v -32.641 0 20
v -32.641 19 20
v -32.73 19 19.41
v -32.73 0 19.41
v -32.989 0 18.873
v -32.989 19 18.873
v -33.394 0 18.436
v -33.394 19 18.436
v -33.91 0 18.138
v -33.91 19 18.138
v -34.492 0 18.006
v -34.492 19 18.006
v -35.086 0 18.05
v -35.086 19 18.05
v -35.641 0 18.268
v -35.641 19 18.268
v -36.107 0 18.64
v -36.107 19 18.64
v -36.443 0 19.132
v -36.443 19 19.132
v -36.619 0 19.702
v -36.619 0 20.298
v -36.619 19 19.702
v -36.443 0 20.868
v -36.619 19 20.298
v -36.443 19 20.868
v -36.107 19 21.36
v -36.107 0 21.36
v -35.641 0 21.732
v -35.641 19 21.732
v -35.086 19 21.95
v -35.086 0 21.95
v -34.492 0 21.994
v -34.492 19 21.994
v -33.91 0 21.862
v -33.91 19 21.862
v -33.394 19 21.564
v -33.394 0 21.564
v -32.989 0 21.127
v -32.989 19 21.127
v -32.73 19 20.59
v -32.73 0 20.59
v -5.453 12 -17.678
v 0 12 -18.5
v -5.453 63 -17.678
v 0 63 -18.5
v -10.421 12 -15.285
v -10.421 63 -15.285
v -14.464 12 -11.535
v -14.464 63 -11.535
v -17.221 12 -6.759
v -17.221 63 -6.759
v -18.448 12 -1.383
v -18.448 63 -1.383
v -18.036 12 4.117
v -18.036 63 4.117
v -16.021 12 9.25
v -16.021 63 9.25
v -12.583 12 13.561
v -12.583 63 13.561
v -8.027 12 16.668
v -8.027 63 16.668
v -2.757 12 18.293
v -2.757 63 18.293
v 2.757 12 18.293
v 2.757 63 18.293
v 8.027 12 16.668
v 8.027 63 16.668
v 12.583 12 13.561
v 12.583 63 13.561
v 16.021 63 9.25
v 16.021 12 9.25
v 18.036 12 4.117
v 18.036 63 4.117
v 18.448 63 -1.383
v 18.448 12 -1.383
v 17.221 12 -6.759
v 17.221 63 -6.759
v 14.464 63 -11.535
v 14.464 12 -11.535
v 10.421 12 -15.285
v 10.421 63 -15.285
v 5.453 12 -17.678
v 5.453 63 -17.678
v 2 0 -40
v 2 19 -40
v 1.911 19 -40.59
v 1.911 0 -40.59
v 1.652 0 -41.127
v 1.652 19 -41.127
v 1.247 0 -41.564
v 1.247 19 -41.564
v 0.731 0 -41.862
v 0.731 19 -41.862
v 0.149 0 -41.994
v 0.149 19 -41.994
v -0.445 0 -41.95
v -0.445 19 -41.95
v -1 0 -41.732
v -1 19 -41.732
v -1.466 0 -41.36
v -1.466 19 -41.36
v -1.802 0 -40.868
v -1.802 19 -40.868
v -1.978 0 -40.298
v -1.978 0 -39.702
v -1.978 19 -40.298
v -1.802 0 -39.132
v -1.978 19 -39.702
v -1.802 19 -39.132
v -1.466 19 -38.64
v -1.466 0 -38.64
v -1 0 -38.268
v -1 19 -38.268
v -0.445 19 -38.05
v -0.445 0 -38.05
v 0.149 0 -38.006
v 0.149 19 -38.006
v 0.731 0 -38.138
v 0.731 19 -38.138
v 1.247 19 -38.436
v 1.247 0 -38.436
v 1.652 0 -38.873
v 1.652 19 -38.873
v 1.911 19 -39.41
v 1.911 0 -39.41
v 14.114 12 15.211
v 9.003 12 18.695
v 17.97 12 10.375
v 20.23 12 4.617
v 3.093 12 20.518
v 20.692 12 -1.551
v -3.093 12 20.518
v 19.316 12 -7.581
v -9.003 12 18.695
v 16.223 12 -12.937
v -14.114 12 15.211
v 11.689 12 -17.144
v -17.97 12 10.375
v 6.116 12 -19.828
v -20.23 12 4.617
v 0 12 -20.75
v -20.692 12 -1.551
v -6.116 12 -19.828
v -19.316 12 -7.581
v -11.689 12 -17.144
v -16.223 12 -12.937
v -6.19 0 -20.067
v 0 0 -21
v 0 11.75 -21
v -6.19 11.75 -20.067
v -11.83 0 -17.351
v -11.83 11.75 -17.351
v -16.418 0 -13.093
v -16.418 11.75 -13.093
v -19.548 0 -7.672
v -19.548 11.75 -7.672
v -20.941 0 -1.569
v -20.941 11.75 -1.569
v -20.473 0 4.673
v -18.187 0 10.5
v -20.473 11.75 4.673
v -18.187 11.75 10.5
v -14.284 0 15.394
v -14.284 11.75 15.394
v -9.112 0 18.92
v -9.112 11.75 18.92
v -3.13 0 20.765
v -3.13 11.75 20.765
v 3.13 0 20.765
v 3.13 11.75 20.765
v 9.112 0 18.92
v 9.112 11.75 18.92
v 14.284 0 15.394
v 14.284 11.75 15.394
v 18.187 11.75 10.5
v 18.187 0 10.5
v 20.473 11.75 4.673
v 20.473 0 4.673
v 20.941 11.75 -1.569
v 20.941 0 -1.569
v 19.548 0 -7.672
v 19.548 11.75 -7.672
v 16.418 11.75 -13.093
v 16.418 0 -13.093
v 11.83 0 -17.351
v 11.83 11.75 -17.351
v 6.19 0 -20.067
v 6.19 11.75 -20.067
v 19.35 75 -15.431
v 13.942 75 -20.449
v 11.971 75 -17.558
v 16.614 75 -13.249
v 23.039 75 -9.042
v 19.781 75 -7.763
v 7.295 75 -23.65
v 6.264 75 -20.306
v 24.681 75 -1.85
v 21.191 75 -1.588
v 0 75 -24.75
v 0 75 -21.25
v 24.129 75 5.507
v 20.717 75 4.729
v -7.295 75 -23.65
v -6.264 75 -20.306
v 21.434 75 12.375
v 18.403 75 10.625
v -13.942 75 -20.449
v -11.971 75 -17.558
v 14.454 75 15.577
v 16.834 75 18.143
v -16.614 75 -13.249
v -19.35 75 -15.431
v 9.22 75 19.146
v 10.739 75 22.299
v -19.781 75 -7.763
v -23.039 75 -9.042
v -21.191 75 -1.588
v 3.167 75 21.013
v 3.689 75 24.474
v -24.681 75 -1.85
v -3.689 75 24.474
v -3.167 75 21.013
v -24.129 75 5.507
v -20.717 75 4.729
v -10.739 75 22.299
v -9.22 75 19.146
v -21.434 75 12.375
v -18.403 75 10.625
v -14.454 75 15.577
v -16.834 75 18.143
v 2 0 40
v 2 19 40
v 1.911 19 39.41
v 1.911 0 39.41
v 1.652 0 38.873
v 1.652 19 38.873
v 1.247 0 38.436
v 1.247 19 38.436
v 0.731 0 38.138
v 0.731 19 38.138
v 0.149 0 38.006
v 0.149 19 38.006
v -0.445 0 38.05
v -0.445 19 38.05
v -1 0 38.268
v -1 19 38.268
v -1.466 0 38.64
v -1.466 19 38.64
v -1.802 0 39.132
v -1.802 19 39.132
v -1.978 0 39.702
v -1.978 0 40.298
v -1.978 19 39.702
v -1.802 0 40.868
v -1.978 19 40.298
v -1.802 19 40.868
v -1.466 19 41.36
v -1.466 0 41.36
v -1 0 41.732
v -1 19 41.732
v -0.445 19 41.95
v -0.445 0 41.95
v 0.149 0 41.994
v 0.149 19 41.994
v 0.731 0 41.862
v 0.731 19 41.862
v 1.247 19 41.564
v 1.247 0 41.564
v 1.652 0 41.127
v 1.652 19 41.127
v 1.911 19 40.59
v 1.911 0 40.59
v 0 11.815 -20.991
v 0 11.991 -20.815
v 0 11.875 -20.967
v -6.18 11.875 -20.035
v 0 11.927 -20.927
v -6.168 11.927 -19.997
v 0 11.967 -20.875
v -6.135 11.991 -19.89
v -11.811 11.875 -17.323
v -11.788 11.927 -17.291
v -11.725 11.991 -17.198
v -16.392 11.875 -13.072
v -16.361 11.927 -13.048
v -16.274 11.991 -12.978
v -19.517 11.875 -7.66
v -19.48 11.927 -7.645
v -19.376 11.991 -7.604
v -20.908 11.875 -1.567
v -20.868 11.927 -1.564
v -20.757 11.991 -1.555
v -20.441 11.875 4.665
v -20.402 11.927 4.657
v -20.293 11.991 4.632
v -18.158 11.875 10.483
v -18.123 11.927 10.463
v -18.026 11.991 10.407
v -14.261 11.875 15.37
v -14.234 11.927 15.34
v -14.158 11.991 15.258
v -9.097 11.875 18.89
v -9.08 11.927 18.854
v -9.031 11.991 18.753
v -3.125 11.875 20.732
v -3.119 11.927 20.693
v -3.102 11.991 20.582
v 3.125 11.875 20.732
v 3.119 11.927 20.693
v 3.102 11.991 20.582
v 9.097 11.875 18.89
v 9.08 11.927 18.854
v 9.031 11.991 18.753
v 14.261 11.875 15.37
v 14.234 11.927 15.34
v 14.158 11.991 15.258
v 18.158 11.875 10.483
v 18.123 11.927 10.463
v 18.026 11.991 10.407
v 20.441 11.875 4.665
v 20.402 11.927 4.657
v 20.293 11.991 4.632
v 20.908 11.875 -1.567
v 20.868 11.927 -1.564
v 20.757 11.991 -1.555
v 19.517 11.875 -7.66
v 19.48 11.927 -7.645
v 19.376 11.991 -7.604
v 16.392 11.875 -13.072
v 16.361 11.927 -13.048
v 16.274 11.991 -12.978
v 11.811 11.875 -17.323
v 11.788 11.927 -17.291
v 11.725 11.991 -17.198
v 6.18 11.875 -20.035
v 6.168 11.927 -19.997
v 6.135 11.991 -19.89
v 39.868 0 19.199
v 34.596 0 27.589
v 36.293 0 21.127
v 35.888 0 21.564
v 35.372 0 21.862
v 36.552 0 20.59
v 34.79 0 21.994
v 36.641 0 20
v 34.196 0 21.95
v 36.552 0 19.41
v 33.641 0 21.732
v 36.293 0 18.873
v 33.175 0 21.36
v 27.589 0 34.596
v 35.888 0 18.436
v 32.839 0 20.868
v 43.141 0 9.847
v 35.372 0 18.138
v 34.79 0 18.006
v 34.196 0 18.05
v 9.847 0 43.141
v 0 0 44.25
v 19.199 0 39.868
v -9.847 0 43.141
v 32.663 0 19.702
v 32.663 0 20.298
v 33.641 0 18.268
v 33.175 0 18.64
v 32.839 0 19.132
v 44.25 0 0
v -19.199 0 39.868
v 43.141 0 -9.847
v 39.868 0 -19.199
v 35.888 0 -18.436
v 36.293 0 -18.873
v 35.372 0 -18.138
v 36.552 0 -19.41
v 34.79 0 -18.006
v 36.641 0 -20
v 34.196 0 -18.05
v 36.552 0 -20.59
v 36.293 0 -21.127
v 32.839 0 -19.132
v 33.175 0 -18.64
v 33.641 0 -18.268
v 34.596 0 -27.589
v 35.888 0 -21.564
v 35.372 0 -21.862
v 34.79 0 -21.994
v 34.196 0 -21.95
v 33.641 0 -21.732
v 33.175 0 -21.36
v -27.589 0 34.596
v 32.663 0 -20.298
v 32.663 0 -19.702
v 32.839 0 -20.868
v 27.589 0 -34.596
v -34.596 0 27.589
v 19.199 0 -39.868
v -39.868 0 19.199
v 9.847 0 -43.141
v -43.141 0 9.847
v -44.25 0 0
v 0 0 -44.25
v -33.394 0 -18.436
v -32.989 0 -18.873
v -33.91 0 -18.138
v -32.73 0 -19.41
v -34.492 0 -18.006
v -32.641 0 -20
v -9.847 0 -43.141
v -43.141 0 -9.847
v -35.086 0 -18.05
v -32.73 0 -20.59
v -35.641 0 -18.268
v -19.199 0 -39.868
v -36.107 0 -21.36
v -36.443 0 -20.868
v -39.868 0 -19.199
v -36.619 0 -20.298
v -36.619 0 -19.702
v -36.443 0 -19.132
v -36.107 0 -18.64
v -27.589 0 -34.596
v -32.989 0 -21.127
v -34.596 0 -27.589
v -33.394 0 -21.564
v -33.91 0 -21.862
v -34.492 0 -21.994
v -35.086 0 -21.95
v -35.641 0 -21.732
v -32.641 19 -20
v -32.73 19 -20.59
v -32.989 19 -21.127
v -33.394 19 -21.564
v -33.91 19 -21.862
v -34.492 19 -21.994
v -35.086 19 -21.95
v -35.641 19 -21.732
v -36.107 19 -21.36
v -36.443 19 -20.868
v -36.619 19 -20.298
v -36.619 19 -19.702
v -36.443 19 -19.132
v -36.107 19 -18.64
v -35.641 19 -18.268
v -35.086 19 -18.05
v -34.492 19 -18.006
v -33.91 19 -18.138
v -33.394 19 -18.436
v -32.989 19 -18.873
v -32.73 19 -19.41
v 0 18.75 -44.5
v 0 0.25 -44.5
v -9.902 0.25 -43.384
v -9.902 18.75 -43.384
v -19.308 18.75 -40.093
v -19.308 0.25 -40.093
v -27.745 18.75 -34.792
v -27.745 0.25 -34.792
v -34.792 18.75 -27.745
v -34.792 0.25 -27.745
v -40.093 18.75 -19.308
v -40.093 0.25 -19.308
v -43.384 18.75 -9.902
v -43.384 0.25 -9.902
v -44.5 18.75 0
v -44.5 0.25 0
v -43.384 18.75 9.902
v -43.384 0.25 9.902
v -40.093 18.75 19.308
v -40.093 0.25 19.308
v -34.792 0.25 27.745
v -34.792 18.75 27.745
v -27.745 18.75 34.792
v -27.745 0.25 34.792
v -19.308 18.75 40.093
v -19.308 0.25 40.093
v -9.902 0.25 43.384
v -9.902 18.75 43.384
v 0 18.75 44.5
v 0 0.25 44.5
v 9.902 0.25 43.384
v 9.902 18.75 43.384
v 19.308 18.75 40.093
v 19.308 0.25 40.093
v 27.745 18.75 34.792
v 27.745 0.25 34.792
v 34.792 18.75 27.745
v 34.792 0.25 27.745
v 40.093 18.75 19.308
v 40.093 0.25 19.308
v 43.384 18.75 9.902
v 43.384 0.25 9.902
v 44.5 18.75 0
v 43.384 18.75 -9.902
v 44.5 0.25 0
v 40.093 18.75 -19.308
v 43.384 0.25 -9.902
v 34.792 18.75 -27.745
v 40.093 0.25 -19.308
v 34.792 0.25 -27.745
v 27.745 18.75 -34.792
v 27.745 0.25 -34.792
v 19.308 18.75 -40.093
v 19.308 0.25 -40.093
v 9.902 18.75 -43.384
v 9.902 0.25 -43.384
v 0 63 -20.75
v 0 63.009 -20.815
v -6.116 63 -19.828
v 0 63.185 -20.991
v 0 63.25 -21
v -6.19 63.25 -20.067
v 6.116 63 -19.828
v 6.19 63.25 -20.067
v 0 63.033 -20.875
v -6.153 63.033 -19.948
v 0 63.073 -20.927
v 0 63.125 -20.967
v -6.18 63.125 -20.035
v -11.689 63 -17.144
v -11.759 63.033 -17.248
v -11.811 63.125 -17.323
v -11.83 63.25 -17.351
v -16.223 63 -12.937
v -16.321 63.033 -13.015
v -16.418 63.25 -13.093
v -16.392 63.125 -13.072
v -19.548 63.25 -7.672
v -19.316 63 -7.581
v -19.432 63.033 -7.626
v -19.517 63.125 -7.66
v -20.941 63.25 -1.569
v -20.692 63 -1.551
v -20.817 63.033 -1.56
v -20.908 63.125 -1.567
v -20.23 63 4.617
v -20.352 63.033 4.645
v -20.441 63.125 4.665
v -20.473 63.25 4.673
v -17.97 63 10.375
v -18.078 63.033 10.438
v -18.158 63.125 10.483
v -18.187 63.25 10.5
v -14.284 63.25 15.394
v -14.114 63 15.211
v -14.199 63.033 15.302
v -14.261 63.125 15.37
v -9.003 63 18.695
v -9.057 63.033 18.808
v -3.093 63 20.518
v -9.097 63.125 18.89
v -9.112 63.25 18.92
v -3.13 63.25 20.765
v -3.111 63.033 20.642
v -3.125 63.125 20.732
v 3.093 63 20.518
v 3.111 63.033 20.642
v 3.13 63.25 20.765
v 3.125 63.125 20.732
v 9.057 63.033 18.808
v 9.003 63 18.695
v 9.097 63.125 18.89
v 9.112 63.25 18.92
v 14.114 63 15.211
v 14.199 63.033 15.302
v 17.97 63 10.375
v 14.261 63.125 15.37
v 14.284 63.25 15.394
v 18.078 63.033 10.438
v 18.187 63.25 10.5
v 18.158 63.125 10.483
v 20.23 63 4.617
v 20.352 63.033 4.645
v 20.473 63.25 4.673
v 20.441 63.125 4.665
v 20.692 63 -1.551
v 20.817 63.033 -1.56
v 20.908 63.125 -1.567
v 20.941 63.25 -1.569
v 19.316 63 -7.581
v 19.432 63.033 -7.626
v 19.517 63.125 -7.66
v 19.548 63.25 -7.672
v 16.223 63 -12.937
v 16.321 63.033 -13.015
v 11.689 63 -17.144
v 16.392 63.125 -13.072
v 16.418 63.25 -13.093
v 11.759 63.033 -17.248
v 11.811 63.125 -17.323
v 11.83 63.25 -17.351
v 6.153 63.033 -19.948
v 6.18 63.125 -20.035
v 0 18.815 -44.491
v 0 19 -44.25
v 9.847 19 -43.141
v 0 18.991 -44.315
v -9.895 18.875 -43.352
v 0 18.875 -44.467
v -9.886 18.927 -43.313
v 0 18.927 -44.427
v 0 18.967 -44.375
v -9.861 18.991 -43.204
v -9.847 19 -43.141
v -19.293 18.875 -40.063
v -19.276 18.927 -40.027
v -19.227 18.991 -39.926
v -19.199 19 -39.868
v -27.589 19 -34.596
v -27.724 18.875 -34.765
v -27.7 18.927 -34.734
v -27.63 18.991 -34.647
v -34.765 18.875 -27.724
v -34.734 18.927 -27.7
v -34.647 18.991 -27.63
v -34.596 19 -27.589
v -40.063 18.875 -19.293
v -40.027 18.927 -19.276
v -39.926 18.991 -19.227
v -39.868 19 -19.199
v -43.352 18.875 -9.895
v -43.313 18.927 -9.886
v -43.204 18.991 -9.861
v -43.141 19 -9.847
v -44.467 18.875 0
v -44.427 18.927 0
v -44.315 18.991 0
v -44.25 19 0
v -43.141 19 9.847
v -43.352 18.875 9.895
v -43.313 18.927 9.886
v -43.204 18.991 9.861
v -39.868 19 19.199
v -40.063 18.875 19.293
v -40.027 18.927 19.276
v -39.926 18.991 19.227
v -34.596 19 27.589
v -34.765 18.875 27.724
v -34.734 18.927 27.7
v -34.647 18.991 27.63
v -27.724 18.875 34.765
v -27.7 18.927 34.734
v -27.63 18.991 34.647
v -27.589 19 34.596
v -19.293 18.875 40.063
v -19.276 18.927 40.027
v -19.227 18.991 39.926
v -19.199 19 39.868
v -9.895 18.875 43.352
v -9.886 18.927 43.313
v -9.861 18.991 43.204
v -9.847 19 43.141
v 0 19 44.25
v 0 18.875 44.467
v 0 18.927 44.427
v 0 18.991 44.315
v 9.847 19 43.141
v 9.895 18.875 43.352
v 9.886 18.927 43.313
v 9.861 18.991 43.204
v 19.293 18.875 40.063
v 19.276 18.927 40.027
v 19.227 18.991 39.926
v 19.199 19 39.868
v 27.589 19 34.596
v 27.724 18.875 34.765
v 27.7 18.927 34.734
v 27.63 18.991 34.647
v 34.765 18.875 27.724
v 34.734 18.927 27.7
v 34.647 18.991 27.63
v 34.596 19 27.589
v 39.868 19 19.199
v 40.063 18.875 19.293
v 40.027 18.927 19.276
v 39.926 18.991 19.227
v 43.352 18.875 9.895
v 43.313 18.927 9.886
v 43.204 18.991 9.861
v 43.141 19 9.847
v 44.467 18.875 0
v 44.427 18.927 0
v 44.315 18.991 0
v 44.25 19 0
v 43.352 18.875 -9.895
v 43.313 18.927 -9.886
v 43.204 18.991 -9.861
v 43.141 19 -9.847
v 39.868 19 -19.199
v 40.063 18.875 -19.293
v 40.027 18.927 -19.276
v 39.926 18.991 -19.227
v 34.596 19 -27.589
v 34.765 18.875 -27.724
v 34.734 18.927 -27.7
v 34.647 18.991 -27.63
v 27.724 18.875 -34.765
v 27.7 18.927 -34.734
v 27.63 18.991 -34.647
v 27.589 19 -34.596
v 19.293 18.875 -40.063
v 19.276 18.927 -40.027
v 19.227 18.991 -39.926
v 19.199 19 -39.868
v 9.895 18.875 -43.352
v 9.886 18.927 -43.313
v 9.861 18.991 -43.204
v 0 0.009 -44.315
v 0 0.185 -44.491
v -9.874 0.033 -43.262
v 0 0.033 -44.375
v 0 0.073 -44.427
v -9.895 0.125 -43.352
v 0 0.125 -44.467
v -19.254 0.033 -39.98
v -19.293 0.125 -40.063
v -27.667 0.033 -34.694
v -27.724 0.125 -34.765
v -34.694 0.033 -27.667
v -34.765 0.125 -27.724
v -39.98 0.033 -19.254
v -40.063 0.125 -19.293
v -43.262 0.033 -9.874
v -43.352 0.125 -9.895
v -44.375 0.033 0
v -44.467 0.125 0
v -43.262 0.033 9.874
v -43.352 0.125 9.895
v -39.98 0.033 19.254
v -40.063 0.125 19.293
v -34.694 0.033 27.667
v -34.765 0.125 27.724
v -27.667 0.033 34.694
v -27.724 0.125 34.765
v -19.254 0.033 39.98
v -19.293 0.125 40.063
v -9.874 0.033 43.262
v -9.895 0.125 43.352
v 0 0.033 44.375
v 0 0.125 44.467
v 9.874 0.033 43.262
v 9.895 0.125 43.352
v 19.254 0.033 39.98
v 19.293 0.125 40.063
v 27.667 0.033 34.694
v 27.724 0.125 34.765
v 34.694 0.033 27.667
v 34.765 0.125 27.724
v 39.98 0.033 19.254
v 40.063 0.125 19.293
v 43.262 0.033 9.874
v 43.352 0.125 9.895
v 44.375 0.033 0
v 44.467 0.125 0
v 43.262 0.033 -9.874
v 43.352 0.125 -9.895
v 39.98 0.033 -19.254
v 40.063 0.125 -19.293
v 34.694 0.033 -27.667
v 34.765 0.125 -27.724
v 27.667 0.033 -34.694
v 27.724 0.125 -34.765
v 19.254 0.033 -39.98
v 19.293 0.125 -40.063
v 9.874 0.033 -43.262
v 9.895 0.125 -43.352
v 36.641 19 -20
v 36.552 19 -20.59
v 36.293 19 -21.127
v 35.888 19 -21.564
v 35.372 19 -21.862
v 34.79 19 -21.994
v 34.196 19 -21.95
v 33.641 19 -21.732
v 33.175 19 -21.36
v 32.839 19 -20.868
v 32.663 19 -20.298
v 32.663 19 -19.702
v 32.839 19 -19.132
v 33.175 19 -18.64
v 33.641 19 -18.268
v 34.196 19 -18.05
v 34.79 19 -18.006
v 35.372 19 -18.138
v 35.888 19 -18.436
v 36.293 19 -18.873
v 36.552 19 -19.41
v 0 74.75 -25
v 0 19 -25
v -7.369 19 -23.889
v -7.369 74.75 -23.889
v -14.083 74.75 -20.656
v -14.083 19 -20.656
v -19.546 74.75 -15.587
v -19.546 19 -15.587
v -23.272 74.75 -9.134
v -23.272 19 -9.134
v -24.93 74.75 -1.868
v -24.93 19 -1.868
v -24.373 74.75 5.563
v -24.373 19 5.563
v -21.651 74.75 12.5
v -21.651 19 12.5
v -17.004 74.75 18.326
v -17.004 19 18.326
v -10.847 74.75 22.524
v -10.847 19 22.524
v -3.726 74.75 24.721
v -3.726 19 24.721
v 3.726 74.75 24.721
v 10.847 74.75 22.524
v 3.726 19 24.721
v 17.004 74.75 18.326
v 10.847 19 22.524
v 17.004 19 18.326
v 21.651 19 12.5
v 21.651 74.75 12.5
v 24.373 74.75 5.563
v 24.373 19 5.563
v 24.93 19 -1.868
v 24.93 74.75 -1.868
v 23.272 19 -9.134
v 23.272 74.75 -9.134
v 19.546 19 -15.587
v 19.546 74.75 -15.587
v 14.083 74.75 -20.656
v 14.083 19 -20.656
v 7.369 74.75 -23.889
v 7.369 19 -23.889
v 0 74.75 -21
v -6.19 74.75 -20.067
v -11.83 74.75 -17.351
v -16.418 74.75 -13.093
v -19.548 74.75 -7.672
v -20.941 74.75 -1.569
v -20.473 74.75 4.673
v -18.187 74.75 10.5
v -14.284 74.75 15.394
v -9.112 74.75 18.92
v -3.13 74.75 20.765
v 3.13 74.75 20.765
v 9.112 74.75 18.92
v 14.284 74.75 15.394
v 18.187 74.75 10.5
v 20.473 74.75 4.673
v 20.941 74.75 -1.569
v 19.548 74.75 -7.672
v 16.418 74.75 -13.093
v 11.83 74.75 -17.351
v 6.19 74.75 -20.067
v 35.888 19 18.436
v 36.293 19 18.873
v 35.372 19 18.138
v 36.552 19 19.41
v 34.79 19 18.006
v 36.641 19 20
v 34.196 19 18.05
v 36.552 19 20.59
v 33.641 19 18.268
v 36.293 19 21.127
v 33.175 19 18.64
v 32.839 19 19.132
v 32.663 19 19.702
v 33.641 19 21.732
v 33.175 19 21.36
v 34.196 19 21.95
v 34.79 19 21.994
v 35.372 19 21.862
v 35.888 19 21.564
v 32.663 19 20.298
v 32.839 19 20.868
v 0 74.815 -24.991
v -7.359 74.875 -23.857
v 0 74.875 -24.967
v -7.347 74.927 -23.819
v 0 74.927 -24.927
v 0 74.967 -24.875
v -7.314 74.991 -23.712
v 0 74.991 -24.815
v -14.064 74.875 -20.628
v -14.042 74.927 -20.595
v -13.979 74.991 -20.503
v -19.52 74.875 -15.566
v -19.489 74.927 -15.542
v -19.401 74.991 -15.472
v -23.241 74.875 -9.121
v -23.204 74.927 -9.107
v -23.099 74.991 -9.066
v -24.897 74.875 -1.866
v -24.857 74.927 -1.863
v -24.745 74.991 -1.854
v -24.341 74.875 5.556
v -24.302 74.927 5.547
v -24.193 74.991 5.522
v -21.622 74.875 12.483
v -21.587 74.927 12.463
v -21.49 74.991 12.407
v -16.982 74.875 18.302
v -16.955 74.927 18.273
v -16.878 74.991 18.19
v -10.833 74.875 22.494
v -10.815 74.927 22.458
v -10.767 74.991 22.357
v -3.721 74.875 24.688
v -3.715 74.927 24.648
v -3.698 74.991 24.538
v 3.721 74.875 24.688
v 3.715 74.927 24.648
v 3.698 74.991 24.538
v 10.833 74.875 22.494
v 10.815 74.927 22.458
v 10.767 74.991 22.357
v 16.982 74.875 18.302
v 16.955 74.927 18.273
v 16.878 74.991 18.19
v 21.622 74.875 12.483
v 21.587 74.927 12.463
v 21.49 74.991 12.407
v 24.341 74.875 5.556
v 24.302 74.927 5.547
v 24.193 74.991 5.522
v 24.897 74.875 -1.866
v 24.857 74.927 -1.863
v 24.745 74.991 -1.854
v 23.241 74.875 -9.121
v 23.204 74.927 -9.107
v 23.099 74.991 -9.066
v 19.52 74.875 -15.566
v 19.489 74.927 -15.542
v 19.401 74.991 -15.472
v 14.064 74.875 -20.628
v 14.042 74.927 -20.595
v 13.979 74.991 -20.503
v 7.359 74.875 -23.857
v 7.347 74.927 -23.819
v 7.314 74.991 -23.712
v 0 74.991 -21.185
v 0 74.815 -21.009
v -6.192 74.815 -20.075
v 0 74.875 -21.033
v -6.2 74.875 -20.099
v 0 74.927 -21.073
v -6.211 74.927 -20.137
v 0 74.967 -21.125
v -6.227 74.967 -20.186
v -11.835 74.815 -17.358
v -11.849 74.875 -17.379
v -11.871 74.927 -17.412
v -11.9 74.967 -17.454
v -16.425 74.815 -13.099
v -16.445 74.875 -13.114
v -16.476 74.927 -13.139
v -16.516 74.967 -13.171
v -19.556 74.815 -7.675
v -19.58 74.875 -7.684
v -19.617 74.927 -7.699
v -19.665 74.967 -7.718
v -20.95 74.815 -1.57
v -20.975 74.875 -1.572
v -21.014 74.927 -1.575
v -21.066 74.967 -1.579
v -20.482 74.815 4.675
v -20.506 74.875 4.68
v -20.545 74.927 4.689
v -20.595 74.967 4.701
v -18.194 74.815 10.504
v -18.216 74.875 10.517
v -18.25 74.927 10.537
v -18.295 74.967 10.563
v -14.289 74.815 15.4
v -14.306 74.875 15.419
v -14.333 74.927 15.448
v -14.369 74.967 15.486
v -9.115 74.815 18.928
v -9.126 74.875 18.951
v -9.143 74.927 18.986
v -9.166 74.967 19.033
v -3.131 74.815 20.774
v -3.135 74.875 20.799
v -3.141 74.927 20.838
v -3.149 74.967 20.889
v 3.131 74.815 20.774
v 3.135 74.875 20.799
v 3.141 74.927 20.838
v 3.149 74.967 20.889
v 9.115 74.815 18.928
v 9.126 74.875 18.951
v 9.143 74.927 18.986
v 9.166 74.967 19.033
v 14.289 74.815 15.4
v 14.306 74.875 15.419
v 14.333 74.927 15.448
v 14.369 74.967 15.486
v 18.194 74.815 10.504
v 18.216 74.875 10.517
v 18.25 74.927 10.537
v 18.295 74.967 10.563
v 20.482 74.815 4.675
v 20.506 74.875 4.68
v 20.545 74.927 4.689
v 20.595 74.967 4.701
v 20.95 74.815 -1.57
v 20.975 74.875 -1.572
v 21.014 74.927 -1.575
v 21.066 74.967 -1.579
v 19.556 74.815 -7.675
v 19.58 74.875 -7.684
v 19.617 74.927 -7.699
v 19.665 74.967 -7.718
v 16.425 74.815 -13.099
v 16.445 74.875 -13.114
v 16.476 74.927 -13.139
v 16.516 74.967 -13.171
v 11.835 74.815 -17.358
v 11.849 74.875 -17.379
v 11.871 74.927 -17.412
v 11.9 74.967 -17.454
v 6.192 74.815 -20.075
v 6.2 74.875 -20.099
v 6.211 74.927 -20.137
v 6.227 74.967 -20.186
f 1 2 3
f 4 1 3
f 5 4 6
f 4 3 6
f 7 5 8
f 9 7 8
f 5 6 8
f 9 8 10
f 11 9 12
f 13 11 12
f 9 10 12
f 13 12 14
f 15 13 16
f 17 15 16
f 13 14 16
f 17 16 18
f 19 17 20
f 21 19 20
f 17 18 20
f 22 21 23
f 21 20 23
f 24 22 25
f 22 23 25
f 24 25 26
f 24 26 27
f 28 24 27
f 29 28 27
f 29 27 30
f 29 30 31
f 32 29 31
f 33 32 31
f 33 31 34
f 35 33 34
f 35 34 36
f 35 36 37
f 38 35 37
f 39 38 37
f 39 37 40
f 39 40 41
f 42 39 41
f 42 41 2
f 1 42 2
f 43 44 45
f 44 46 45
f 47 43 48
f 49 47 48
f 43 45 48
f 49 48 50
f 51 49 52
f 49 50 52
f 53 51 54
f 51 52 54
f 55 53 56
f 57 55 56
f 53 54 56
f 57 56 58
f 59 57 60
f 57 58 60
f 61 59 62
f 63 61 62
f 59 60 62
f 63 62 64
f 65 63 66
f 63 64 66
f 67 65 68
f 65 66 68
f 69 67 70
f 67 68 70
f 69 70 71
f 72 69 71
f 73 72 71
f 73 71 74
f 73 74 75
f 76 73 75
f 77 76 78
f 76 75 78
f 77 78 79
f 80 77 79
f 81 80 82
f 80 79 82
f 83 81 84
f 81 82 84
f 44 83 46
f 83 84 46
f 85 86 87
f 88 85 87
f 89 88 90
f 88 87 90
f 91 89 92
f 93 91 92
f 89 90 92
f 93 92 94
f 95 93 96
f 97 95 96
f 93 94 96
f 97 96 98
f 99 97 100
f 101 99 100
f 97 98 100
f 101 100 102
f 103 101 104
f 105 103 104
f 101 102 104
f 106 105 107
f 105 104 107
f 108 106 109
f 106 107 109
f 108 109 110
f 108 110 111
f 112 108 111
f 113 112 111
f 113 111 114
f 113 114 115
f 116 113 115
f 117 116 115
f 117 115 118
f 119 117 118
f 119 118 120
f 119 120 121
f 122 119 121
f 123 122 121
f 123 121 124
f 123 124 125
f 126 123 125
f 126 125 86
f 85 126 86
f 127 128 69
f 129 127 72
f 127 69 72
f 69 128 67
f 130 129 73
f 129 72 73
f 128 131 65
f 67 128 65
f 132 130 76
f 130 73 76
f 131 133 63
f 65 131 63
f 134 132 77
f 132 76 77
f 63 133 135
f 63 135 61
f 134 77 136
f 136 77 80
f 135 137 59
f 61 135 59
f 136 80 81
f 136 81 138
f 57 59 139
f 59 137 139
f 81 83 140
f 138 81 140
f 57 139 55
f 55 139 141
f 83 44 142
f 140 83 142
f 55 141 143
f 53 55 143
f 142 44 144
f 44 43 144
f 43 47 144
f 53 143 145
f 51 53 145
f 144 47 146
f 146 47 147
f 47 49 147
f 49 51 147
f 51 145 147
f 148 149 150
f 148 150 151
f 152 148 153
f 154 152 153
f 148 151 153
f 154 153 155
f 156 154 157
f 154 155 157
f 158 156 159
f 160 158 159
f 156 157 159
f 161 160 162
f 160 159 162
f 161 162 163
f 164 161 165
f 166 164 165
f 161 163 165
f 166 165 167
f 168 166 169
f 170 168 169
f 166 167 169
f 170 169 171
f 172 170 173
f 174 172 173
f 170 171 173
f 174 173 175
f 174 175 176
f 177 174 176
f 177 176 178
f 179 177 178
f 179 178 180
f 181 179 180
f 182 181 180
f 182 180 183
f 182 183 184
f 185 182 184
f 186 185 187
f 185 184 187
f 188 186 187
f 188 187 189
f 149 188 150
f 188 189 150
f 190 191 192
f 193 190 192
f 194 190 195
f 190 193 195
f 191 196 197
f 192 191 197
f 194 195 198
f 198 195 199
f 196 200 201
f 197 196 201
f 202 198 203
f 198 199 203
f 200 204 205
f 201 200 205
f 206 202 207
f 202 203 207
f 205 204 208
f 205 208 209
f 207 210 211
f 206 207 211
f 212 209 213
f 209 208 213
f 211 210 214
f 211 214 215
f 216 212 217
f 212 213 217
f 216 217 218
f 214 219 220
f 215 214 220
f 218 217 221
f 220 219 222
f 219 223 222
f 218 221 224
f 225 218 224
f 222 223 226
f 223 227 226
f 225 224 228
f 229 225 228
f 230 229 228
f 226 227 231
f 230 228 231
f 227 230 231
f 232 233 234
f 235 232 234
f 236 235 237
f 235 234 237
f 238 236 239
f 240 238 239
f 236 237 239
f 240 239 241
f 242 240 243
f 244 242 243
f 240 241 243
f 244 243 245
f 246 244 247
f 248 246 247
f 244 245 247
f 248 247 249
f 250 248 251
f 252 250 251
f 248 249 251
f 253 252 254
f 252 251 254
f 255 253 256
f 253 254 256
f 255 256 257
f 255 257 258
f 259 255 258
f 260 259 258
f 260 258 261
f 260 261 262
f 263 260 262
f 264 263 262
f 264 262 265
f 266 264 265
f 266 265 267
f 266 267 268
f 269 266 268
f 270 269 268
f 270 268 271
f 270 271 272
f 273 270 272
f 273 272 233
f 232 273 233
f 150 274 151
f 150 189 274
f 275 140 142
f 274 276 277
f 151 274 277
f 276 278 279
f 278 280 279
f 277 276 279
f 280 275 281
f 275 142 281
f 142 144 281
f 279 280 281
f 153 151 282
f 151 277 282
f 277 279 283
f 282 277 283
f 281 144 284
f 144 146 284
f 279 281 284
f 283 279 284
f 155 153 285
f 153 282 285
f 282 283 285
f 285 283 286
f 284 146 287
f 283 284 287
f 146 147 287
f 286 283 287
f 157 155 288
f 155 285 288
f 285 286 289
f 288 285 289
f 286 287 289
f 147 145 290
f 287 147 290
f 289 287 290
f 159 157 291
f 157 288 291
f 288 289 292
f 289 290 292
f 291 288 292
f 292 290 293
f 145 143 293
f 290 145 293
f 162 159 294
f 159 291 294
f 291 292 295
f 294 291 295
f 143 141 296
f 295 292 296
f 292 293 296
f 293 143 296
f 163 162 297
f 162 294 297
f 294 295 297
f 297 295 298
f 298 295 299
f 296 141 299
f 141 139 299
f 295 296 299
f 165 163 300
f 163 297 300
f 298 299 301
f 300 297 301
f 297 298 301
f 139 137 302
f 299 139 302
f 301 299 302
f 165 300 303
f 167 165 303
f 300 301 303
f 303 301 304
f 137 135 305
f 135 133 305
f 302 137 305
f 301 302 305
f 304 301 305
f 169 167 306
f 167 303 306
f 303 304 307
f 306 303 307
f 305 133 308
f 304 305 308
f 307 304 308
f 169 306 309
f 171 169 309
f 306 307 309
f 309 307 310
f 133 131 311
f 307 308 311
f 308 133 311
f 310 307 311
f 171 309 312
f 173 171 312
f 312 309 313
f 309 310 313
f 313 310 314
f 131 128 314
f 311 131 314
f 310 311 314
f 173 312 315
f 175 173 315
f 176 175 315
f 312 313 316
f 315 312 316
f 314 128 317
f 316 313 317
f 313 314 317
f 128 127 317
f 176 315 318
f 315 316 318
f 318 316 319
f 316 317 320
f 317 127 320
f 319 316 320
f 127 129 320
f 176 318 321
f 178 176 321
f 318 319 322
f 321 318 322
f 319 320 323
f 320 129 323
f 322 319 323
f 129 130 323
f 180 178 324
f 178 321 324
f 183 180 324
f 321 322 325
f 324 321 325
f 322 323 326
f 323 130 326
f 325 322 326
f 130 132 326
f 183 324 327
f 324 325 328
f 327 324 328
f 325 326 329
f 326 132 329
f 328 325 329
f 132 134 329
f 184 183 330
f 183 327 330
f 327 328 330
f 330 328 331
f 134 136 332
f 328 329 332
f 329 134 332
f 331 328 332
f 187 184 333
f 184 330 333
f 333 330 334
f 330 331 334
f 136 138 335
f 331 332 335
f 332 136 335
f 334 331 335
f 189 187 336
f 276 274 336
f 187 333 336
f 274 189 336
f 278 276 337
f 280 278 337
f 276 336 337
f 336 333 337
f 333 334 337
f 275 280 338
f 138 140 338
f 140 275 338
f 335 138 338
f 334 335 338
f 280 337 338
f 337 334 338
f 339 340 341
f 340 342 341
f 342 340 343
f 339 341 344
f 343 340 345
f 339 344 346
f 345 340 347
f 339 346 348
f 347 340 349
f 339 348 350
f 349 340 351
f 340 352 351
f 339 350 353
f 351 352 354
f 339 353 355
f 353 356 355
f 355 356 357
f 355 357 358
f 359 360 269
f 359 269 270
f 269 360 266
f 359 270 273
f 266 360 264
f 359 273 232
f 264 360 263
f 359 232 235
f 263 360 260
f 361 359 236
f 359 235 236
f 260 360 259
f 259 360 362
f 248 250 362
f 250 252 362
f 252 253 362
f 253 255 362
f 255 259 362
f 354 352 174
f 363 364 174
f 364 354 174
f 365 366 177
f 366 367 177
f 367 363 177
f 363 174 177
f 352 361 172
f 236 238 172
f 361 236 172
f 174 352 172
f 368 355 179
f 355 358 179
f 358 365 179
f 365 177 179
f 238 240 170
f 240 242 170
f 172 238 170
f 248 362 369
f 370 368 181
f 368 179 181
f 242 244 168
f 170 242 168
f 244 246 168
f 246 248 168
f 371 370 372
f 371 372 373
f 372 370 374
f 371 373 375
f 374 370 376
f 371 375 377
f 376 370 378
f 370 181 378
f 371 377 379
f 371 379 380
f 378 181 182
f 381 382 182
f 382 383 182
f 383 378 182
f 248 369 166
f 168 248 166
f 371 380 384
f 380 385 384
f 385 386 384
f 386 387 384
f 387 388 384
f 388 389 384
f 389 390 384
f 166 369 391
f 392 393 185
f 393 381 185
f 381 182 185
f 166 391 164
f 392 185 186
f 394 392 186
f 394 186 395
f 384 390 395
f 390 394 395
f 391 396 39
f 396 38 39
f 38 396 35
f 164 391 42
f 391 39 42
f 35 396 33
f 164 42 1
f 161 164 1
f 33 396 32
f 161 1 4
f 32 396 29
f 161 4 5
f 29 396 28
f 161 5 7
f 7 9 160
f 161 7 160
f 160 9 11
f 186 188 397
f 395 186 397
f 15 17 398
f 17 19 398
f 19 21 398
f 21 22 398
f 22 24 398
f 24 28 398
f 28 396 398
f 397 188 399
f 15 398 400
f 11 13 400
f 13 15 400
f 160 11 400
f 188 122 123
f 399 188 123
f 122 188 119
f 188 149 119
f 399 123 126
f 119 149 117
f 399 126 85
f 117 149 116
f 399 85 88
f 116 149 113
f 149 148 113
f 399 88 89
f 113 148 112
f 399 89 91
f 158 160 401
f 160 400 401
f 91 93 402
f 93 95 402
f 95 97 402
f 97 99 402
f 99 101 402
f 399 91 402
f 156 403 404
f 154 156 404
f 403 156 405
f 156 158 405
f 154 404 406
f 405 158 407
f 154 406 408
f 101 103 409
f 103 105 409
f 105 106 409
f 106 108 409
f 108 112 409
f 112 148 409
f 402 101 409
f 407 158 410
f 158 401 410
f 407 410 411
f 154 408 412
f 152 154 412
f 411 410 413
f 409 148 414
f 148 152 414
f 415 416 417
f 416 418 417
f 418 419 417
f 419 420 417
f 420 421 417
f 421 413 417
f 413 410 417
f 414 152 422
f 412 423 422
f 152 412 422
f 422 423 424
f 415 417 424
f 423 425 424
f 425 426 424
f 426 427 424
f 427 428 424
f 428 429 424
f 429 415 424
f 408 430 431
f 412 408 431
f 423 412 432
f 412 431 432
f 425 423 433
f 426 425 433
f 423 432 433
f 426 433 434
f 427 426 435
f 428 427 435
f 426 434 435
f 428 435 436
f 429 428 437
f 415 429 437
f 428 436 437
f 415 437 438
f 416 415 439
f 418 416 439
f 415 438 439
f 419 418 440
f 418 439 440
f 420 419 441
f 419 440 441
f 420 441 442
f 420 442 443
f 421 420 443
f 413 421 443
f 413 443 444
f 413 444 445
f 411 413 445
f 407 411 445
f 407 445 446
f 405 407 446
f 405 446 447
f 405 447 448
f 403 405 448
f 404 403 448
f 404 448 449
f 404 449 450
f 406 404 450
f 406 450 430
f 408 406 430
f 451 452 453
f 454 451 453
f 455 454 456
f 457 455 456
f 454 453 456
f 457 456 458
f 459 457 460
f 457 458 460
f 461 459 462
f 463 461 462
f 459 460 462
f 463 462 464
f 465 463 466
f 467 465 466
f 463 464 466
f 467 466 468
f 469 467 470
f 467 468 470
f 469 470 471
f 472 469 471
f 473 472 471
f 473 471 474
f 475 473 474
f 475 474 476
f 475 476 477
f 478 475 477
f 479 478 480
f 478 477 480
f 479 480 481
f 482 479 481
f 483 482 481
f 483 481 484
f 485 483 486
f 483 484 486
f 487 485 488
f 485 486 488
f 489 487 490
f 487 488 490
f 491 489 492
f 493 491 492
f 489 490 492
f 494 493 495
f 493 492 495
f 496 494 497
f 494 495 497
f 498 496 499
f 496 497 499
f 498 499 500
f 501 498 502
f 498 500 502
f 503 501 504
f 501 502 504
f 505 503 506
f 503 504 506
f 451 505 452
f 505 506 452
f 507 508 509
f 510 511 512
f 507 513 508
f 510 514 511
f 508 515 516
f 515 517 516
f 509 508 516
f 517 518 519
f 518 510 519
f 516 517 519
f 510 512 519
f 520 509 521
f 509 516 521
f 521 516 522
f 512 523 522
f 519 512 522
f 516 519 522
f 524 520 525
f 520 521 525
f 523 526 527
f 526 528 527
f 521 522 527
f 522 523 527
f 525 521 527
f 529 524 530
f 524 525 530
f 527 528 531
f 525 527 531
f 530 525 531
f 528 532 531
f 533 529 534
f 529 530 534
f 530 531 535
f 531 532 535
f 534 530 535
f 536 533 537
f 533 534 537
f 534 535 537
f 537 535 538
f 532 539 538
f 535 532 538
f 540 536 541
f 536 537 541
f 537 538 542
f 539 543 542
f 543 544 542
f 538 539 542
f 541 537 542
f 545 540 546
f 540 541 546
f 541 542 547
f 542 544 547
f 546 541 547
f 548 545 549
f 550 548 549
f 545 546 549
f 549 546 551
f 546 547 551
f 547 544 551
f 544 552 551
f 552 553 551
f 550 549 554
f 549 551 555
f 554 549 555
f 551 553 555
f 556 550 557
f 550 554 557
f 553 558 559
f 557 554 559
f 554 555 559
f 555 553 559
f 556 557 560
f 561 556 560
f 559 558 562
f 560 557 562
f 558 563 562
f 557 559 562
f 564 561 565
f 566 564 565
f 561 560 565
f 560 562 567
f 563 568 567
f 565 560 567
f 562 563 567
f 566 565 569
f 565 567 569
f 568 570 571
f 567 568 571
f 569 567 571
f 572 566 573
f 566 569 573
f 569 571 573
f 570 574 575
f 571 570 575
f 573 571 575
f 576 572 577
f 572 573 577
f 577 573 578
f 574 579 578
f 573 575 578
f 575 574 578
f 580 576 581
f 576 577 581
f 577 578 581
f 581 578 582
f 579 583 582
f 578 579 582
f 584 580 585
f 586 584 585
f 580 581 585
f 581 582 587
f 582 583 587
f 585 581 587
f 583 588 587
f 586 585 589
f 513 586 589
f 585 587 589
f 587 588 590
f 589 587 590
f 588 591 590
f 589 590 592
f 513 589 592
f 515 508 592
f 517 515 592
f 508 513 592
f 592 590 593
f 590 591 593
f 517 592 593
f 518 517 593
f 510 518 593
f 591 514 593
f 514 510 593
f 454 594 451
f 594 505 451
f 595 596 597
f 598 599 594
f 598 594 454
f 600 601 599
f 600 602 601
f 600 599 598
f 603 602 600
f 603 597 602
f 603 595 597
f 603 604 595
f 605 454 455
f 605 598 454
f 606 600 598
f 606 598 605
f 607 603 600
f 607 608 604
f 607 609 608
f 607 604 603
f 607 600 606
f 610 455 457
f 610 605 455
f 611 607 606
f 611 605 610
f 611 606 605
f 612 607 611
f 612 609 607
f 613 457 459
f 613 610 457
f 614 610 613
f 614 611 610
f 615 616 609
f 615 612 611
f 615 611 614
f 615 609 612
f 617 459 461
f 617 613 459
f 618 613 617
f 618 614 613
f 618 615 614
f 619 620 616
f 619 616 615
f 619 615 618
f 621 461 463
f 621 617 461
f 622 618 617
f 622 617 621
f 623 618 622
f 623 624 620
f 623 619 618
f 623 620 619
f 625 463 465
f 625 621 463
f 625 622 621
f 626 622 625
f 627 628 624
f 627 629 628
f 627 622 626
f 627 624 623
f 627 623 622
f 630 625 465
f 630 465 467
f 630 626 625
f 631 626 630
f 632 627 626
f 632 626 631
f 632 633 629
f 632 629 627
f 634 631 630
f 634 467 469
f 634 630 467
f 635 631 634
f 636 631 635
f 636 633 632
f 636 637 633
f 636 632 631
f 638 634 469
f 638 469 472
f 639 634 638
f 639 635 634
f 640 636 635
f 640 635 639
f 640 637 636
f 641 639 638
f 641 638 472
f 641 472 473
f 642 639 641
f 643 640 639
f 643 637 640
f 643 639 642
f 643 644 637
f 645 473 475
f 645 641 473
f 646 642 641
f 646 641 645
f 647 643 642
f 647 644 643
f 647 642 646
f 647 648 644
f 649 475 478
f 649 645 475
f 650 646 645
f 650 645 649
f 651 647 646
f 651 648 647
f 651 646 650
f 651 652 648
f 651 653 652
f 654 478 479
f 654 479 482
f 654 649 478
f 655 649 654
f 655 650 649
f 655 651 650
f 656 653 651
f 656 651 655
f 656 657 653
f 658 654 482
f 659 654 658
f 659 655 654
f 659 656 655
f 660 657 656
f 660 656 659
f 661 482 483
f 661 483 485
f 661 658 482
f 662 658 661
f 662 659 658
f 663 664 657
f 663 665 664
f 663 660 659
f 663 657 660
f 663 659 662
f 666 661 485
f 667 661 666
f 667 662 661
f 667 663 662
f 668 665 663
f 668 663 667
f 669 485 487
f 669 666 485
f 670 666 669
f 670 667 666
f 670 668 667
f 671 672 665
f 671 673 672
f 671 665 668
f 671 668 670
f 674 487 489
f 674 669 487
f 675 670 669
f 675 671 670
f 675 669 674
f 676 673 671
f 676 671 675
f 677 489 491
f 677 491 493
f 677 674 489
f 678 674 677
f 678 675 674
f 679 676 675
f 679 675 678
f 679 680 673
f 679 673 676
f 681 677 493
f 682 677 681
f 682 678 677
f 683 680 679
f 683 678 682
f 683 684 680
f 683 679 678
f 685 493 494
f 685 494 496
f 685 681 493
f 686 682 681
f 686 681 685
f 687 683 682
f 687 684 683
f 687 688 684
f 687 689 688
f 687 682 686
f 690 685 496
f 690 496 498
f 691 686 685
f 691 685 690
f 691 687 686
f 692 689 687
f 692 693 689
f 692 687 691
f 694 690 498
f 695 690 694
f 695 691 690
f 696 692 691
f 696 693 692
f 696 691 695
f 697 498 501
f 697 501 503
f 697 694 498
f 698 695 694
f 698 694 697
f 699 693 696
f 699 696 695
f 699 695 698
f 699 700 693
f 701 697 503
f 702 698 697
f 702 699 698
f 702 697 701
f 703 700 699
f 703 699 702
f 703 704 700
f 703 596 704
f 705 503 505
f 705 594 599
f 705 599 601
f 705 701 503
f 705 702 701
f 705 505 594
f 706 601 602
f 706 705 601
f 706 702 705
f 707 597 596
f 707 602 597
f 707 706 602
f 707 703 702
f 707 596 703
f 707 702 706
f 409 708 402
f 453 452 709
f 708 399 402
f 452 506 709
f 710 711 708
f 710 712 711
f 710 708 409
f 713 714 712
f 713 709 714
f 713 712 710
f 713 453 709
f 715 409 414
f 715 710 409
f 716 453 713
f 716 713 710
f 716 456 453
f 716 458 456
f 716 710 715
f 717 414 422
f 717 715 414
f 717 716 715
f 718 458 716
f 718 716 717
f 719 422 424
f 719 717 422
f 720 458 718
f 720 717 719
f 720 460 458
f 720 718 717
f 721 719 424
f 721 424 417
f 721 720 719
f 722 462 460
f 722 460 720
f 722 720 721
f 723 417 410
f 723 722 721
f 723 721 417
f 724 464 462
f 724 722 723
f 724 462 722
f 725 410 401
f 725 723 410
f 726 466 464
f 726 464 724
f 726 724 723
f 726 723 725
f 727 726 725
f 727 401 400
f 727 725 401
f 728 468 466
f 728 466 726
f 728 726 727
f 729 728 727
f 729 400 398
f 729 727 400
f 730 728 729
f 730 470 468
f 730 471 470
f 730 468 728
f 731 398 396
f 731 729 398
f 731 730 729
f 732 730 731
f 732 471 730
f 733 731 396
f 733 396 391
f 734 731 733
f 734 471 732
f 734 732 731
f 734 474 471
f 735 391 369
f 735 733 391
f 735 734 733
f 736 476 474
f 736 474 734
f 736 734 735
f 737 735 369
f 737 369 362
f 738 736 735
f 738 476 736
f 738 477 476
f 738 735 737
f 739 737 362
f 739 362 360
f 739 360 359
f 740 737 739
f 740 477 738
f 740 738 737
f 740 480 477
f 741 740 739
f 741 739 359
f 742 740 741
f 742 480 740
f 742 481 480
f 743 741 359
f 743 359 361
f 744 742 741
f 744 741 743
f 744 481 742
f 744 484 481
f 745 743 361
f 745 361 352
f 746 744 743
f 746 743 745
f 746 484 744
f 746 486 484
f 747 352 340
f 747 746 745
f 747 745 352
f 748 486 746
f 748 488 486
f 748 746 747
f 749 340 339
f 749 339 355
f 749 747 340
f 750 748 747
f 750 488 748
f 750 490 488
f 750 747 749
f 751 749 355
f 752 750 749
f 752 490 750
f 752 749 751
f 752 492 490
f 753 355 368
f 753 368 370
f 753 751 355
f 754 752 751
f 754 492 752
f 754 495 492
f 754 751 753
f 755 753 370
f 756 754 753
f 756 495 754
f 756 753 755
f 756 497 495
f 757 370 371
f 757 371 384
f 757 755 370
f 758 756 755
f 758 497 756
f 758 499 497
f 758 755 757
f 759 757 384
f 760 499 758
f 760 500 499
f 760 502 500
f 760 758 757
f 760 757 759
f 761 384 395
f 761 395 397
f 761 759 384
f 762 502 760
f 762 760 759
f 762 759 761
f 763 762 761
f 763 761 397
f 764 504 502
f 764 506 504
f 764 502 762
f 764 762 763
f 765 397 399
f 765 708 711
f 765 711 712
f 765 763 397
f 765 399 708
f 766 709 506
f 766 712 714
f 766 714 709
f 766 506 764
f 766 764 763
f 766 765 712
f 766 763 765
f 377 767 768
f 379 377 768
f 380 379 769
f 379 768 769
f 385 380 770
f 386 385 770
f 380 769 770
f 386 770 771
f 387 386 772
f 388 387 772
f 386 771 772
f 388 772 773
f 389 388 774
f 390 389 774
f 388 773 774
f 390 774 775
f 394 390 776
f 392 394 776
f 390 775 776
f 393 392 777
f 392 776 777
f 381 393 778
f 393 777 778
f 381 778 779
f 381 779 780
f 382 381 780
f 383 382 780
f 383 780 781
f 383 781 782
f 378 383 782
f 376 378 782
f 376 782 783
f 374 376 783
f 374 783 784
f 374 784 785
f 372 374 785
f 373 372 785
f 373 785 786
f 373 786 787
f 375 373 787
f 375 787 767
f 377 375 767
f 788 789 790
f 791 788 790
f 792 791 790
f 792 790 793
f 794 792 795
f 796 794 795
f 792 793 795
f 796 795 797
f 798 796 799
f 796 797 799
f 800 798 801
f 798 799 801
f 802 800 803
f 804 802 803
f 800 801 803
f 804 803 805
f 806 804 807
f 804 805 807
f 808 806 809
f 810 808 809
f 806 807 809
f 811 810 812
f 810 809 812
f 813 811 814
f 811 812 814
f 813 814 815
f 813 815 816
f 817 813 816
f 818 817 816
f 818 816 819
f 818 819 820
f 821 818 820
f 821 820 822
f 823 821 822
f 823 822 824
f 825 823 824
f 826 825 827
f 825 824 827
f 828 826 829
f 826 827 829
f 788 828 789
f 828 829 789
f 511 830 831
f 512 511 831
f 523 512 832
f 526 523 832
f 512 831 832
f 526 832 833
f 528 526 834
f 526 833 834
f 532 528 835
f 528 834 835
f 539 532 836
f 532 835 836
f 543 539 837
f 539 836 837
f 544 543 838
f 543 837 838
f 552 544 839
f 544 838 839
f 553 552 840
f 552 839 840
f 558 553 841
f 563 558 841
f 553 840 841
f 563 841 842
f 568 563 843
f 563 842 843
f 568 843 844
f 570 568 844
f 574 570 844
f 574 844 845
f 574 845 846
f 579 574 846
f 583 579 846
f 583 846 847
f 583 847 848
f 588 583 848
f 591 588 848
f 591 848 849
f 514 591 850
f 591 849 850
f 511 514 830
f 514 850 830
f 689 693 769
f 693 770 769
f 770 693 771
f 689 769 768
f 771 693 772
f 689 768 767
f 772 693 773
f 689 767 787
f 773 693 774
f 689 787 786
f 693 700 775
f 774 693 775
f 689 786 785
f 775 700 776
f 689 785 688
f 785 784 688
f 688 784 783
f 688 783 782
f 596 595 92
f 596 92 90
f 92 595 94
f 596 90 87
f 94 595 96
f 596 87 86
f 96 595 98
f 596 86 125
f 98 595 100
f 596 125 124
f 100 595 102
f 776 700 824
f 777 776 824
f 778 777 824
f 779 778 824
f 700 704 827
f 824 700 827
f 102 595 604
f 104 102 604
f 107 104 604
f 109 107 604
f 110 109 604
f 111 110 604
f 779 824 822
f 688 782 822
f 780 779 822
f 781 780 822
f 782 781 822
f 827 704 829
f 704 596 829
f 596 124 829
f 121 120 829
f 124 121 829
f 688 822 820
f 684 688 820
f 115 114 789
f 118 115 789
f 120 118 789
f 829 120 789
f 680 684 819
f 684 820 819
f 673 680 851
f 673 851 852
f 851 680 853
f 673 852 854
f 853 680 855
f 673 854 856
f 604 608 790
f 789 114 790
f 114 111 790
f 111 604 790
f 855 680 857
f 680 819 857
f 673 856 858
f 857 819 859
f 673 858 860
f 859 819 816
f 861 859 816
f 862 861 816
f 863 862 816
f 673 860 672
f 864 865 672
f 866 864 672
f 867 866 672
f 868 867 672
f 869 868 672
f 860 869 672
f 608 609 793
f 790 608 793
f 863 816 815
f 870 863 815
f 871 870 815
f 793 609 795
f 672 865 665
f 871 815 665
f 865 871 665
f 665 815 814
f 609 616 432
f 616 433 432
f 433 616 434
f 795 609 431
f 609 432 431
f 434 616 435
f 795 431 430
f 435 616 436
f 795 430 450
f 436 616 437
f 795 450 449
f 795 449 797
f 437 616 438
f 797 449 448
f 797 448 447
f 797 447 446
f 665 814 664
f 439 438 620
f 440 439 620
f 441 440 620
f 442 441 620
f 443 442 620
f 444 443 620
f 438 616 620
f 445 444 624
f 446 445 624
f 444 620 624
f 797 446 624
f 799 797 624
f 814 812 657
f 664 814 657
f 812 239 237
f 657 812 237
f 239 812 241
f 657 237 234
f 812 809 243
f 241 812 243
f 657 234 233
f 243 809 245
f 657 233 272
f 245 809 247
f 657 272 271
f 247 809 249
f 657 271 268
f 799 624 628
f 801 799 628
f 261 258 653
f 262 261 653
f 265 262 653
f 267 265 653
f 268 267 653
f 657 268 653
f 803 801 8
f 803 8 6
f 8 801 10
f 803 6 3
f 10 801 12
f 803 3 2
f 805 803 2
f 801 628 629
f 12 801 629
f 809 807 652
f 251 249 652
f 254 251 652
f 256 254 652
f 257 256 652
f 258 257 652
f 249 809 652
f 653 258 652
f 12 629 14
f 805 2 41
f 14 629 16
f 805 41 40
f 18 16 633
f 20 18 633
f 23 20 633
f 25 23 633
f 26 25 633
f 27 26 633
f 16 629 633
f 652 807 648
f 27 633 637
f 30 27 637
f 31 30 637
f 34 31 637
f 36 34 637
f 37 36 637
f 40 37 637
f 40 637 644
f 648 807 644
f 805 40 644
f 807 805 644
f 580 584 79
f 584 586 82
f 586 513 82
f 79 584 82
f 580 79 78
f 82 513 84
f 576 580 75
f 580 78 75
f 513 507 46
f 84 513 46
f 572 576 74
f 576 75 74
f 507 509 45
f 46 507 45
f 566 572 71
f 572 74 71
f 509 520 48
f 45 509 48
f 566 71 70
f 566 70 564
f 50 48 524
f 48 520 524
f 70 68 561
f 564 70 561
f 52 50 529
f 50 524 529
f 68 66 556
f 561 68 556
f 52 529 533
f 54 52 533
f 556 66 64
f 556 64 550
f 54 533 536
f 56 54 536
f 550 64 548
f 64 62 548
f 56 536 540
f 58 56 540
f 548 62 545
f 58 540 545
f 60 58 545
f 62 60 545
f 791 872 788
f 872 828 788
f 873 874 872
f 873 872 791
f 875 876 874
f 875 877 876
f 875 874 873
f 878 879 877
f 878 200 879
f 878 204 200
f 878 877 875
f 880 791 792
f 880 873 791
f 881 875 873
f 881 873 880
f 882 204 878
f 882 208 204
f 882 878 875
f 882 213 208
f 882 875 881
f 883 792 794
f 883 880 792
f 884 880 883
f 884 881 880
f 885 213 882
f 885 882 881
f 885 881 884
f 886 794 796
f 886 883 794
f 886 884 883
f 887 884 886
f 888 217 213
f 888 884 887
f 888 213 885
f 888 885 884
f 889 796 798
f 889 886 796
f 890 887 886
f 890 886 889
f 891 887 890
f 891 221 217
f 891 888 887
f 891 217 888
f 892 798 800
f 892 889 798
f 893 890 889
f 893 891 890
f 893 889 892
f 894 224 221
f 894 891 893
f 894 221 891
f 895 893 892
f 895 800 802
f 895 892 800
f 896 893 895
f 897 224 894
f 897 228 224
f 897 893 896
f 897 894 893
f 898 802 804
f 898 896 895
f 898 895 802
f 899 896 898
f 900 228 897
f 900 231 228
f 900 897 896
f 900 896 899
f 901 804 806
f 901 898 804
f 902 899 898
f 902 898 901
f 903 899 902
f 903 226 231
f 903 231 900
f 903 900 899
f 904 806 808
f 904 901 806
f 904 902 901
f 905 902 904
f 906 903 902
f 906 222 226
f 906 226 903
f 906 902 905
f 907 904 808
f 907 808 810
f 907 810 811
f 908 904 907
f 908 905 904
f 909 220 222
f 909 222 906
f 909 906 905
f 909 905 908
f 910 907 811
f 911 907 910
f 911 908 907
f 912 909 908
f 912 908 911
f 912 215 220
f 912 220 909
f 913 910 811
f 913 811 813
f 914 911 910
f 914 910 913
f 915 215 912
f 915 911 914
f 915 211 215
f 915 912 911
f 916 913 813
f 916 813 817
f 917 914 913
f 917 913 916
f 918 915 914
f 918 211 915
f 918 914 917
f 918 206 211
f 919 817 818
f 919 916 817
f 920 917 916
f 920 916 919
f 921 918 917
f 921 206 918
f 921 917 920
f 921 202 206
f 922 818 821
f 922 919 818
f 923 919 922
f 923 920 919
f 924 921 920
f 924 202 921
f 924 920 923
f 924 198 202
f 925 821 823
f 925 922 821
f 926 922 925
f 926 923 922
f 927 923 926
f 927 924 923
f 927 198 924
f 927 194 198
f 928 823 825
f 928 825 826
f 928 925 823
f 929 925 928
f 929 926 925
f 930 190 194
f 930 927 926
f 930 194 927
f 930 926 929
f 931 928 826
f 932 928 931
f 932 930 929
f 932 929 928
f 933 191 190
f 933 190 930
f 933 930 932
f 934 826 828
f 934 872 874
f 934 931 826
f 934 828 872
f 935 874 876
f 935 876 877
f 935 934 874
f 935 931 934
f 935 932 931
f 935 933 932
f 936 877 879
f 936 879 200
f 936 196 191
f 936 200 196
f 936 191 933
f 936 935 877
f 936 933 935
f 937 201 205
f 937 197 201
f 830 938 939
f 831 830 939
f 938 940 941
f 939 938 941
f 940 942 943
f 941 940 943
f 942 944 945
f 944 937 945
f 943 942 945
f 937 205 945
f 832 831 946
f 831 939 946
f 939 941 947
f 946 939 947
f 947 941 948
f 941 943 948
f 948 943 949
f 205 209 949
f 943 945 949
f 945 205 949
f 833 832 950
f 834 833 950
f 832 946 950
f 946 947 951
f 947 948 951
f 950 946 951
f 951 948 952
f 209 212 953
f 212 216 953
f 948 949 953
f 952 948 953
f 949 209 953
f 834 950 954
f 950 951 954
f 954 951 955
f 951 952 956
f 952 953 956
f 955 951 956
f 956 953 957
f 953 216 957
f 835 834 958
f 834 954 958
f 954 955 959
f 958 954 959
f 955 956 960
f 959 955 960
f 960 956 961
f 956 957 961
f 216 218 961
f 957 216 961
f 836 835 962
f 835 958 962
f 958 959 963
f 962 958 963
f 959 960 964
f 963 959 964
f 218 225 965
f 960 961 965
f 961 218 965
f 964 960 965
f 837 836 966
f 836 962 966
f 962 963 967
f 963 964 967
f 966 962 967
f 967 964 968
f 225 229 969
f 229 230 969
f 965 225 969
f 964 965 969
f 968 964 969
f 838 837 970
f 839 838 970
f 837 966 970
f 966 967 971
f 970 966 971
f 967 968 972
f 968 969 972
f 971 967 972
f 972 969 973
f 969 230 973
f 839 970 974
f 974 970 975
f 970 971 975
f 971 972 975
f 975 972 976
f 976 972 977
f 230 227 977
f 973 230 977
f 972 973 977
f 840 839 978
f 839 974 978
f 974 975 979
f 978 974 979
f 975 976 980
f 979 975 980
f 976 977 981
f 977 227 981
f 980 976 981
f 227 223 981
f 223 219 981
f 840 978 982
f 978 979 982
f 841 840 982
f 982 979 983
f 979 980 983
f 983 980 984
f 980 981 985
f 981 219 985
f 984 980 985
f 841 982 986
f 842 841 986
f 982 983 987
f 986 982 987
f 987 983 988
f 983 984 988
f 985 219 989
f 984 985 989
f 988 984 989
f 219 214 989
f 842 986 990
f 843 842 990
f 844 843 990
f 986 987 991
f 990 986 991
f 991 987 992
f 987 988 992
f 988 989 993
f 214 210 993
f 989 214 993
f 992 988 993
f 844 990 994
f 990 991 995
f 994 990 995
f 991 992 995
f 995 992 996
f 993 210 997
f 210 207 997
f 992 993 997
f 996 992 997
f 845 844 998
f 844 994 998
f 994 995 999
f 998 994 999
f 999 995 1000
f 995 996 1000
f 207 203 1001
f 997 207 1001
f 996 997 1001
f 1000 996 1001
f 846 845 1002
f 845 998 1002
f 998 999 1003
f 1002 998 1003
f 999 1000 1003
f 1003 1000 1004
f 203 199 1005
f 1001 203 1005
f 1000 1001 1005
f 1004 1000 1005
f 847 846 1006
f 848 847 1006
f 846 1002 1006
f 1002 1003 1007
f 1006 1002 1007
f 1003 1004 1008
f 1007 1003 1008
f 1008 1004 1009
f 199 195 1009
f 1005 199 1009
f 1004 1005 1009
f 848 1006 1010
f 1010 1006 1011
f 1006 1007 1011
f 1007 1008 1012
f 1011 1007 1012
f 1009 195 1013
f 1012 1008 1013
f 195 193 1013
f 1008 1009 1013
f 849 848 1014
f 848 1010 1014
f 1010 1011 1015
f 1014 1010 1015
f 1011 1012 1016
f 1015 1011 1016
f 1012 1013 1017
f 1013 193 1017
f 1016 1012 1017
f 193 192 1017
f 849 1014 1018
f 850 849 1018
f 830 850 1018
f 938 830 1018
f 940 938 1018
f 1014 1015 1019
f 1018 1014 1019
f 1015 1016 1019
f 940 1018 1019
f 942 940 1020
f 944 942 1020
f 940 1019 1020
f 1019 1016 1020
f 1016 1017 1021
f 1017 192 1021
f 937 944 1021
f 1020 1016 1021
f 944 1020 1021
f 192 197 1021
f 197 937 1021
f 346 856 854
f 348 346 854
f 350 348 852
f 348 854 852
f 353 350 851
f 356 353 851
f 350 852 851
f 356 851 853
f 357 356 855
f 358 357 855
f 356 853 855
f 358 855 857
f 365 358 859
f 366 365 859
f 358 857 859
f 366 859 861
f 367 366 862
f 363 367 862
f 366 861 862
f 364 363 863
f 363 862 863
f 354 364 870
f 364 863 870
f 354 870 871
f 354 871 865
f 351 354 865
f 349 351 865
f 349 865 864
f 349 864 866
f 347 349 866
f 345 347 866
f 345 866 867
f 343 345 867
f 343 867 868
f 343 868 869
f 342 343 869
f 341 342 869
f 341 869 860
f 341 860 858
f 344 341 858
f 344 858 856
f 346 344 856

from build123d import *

# Parameters (mm, degrees)
SKETCH2_R          = 2
CUT_EXTRUDE1_DEPTH = 20
FILLET1_R          = 0.25


with BuildPart() as part:
    # Sketch1 → Revolve1 (revolve)
    with BuildSketch(Plane(origin=(0, 0, 0), x_dir=(0, 0, -1), z_dir=(1, 0, 0))):
        Polygon((21, 0), (21, 12), (18.5, 12), (18.5, 63), (21, 63), (21, 75), (25, 75), (25, 19), (44.5, 19), (44.5, 0), align=None)
    revolve(axis=Axis((0, -1000.237288136, 0), (0, 1, 0)))

    # Sketch2 → Cut-Extrude1 (cut, through all)
    with BuildSketch(Plane(origin=(0, 19, 0), x_dir=(1, 0, 0), z_dir=(0, 1, 0))):
        with Locations((0, 40)):
            Circle(SKETCH2_R)
        with Locations((34.641016151, 20)):
            Circle(SKETCH2_R)
        with Locations((34.641016151, -20)):
            Circle(SKETCH2_R)
        with Locations((0, -40)):
            Circle(SKETCH2_R)
        with Locations((-34.641016151, -20)):
            Circle(SKETCH2_R)
        with Locations((-34.641016151, 20)):
            Circle(SKETCH2_R)
    extrude(amount=-CUT_EXTRUDE1_DEPTH, mode=Mode.SUBTRACT)

    # Fillet1
    fillet1_edges = [part.edges().sort_by_distance(p)[0] for p in [
        (0, 12, 21),
        (0, 0, 44.5),
        (0, 19, 44.5),
        (0, 75, 25),
        (0, 75, 21),
        (0, 63, 21),
    ]]
    fillet(fillet1_edges, radius=FILLET1_R)


solid = part.part
